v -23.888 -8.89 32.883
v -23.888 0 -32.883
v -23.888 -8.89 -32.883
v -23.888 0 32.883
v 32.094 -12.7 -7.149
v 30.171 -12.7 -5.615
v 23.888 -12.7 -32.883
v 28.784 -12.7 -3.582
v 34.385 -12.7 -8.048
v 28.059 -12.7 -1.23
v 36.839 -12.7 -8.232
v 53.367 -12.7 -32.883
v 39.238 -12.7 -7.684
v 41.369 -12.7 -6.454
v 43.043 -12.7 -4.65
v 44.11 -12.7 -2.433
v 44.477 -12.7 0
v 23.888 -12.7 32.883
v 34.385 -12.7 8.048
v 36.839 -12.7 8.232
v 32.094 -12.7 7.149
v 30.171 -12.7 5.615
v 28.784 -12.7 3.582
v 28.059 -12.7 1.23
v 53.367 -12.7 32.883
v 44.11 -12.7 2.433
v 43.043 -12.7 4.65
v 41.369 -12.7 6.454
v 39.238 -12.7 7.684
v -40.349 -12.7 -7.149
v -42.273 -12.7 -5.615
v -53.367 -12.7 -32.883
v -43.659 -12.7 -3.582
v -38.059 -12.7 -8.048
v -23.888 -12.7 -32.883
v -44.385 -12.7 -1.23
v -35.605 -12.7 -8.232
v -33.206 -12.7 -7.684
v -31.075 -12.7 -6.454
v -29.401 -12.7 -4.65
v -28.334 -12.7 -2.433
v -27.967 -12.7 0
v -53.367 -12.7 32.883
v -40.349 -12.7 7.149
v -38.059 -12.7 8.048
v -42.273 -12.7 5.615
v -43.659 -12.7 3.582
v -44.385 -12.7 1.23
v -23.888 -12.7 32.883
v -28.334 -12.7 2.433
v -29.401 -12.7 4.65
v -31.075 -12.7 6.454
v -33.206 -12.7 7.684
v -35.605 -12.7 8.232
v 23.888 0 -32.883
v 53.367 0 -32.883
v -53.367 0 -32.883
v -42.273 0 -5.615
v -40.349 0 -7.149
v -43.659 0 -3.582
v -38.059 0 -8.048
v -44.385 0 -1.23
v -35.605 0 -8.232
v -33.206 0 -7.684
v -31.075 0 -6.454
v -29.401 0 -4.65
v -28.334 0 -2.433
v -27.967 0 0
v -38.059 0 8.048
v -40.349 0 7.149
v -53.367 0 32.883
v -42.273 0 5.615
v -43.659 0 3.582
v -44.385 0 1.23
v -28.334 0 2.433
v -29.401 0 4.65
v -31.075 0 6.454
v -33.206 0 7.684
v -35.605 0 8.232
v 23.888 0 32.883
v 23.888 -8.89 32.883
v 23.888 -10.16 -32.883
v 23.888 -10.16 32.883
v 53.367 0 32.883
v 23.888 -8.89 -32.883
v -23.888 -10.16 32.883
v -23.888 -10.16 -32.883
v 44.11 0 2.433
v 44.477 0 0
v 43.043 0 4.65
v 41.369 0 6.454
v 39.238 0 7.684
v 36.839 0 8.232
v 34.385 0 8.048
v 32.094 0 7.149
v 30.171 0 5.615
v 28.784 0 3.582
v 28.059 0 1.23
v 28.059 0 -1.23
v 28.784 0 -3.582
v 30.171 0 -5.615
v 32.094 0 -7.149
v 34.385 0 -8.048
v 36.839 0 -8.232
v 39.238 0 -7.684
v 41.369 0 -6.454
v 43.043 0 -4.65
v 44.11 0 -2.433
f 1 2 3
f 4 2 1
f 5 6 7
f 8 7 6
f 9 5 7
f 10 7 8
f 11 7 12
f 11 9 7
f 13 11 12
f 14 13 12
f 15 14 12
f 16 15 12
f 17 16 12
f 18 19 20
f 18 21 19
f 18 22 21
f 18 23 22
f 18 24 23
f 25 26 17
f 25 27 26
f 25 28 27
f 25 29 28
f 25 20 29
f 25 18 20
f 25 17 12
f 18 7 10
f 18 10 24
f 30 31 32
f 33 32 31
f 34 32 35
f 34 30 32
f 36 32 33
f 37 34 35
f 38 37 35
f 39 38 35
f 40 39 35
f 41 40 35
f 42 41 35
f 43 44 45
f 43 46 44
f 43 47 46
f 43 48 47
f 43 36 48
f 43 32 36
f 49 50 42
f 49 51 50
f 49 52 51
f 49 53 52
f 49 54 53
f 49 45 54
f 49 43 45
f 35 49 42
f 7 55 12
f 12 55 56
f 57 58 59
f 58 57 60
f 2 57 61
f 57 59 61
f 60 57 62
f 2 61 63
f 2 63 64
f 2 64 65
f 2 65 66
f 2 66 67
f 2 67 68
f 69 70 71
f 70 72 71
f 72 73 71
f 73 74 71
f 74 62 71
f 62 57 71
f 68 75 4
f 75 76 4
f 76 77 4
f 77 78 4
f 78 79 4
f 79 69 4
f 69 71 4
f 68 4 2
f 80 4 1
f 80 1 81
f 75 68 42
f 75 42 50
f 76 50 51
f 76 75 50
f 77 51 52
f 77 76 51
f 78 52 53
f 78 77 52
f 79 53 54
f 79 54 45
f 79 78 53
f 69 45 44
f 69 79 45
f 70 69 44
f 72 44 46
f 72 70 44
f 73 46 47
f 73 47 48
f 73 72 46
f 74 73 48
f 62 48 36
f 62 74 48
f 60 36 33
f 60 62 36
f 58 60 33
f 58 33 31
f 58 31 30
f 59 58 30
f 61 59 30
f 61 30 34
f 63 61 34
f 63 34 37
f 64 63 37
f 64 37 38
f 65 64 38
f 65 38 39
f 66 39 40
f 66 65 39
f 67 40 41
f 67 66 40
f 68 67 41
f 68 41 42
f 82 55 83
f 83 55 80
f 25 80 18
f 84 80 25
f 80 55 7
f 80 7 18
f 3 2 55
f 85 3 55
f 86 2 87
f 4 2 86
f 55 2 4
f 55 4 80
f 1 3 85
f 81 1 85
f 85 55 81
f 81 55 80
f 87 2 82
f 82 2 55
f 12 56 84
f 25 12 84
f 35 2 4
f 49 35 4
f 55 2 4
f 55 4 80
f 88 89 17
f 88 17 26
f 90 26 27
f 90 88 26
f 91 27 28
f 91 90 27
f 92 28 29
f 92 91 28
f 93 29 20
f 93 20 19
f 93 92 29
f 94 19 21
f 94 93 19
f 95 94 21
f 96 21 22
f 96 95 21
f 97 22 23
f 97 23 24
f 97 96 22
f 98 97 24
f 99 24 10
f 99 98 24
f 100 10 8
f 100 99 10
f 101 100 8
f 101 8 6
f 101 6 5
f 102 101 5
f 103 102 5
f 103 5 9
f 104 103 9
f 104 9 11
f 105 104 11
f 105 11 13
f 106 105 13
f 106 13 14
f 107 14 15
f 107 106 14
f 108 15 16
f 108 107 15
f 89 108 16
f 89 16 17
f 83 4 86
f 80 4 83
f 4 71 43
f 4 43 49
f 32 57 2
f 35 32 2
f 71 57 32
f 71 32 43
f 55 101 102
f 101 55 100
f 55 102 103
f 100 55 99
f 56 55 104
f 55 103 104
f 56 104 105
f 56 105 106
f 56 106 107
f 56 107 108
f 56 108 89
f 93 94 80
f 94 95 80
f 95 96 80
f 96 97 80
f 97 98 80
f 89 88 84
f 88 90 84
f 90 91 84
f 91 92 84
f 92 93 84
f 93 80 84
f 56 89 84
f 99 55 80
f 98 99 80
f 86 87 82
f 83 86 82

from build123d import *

# Parameters (mm, degrees)
F0_W     = 47.775754
F0_H     = 65.765324
F1_DEPTH = 10.16
F2_DEPTH = 8.89
F0_W_2   = 29.479064
F0_R     = 8.255
F0_W_3   = 29.479066
F3_DEPTH = 12.7


with BuildPart() as f1:
    # F0 (on Front) → F1 (new body)
    with BuildSketch(Plane.XZ):
        with Locations((-1e-06, 0)):
            Rectangle(F0_W, F0_H)
    extrude(amount=F1_DEPTH)


with BuildPart() as f2:
    # F0 (on Front) → F2 (new body)
    with BuildSketch(Plane.XZ):
        with Locations((-1e-06, 0)):
            Rectangle(F0_W, F0_H)
    extrude(amount=F2_DEPTH)


with BuildPart() as f3:
    # F0 (on Front) → F3 (new body)
    with BuildSketch(Plane.XZ):
        with Locations((-38.62741, 0)):
            Rectangle(F0_W_2, F0_H)
        with Locations((-36.221942, 0)):
            Circle(F0_R, mode=Mode.SUBTRACT)
        with Locations((38.627409, 0)):
            Rectangle(F0_W_3, F0_H)
        with Locations((36.221942, 0)):
            Circle(F0_R, mode=Mode.SUBTRACT)
    extrude(amount=F3_DEPTH)


solid = Compound([f1.part, f2.part, f3.part])
